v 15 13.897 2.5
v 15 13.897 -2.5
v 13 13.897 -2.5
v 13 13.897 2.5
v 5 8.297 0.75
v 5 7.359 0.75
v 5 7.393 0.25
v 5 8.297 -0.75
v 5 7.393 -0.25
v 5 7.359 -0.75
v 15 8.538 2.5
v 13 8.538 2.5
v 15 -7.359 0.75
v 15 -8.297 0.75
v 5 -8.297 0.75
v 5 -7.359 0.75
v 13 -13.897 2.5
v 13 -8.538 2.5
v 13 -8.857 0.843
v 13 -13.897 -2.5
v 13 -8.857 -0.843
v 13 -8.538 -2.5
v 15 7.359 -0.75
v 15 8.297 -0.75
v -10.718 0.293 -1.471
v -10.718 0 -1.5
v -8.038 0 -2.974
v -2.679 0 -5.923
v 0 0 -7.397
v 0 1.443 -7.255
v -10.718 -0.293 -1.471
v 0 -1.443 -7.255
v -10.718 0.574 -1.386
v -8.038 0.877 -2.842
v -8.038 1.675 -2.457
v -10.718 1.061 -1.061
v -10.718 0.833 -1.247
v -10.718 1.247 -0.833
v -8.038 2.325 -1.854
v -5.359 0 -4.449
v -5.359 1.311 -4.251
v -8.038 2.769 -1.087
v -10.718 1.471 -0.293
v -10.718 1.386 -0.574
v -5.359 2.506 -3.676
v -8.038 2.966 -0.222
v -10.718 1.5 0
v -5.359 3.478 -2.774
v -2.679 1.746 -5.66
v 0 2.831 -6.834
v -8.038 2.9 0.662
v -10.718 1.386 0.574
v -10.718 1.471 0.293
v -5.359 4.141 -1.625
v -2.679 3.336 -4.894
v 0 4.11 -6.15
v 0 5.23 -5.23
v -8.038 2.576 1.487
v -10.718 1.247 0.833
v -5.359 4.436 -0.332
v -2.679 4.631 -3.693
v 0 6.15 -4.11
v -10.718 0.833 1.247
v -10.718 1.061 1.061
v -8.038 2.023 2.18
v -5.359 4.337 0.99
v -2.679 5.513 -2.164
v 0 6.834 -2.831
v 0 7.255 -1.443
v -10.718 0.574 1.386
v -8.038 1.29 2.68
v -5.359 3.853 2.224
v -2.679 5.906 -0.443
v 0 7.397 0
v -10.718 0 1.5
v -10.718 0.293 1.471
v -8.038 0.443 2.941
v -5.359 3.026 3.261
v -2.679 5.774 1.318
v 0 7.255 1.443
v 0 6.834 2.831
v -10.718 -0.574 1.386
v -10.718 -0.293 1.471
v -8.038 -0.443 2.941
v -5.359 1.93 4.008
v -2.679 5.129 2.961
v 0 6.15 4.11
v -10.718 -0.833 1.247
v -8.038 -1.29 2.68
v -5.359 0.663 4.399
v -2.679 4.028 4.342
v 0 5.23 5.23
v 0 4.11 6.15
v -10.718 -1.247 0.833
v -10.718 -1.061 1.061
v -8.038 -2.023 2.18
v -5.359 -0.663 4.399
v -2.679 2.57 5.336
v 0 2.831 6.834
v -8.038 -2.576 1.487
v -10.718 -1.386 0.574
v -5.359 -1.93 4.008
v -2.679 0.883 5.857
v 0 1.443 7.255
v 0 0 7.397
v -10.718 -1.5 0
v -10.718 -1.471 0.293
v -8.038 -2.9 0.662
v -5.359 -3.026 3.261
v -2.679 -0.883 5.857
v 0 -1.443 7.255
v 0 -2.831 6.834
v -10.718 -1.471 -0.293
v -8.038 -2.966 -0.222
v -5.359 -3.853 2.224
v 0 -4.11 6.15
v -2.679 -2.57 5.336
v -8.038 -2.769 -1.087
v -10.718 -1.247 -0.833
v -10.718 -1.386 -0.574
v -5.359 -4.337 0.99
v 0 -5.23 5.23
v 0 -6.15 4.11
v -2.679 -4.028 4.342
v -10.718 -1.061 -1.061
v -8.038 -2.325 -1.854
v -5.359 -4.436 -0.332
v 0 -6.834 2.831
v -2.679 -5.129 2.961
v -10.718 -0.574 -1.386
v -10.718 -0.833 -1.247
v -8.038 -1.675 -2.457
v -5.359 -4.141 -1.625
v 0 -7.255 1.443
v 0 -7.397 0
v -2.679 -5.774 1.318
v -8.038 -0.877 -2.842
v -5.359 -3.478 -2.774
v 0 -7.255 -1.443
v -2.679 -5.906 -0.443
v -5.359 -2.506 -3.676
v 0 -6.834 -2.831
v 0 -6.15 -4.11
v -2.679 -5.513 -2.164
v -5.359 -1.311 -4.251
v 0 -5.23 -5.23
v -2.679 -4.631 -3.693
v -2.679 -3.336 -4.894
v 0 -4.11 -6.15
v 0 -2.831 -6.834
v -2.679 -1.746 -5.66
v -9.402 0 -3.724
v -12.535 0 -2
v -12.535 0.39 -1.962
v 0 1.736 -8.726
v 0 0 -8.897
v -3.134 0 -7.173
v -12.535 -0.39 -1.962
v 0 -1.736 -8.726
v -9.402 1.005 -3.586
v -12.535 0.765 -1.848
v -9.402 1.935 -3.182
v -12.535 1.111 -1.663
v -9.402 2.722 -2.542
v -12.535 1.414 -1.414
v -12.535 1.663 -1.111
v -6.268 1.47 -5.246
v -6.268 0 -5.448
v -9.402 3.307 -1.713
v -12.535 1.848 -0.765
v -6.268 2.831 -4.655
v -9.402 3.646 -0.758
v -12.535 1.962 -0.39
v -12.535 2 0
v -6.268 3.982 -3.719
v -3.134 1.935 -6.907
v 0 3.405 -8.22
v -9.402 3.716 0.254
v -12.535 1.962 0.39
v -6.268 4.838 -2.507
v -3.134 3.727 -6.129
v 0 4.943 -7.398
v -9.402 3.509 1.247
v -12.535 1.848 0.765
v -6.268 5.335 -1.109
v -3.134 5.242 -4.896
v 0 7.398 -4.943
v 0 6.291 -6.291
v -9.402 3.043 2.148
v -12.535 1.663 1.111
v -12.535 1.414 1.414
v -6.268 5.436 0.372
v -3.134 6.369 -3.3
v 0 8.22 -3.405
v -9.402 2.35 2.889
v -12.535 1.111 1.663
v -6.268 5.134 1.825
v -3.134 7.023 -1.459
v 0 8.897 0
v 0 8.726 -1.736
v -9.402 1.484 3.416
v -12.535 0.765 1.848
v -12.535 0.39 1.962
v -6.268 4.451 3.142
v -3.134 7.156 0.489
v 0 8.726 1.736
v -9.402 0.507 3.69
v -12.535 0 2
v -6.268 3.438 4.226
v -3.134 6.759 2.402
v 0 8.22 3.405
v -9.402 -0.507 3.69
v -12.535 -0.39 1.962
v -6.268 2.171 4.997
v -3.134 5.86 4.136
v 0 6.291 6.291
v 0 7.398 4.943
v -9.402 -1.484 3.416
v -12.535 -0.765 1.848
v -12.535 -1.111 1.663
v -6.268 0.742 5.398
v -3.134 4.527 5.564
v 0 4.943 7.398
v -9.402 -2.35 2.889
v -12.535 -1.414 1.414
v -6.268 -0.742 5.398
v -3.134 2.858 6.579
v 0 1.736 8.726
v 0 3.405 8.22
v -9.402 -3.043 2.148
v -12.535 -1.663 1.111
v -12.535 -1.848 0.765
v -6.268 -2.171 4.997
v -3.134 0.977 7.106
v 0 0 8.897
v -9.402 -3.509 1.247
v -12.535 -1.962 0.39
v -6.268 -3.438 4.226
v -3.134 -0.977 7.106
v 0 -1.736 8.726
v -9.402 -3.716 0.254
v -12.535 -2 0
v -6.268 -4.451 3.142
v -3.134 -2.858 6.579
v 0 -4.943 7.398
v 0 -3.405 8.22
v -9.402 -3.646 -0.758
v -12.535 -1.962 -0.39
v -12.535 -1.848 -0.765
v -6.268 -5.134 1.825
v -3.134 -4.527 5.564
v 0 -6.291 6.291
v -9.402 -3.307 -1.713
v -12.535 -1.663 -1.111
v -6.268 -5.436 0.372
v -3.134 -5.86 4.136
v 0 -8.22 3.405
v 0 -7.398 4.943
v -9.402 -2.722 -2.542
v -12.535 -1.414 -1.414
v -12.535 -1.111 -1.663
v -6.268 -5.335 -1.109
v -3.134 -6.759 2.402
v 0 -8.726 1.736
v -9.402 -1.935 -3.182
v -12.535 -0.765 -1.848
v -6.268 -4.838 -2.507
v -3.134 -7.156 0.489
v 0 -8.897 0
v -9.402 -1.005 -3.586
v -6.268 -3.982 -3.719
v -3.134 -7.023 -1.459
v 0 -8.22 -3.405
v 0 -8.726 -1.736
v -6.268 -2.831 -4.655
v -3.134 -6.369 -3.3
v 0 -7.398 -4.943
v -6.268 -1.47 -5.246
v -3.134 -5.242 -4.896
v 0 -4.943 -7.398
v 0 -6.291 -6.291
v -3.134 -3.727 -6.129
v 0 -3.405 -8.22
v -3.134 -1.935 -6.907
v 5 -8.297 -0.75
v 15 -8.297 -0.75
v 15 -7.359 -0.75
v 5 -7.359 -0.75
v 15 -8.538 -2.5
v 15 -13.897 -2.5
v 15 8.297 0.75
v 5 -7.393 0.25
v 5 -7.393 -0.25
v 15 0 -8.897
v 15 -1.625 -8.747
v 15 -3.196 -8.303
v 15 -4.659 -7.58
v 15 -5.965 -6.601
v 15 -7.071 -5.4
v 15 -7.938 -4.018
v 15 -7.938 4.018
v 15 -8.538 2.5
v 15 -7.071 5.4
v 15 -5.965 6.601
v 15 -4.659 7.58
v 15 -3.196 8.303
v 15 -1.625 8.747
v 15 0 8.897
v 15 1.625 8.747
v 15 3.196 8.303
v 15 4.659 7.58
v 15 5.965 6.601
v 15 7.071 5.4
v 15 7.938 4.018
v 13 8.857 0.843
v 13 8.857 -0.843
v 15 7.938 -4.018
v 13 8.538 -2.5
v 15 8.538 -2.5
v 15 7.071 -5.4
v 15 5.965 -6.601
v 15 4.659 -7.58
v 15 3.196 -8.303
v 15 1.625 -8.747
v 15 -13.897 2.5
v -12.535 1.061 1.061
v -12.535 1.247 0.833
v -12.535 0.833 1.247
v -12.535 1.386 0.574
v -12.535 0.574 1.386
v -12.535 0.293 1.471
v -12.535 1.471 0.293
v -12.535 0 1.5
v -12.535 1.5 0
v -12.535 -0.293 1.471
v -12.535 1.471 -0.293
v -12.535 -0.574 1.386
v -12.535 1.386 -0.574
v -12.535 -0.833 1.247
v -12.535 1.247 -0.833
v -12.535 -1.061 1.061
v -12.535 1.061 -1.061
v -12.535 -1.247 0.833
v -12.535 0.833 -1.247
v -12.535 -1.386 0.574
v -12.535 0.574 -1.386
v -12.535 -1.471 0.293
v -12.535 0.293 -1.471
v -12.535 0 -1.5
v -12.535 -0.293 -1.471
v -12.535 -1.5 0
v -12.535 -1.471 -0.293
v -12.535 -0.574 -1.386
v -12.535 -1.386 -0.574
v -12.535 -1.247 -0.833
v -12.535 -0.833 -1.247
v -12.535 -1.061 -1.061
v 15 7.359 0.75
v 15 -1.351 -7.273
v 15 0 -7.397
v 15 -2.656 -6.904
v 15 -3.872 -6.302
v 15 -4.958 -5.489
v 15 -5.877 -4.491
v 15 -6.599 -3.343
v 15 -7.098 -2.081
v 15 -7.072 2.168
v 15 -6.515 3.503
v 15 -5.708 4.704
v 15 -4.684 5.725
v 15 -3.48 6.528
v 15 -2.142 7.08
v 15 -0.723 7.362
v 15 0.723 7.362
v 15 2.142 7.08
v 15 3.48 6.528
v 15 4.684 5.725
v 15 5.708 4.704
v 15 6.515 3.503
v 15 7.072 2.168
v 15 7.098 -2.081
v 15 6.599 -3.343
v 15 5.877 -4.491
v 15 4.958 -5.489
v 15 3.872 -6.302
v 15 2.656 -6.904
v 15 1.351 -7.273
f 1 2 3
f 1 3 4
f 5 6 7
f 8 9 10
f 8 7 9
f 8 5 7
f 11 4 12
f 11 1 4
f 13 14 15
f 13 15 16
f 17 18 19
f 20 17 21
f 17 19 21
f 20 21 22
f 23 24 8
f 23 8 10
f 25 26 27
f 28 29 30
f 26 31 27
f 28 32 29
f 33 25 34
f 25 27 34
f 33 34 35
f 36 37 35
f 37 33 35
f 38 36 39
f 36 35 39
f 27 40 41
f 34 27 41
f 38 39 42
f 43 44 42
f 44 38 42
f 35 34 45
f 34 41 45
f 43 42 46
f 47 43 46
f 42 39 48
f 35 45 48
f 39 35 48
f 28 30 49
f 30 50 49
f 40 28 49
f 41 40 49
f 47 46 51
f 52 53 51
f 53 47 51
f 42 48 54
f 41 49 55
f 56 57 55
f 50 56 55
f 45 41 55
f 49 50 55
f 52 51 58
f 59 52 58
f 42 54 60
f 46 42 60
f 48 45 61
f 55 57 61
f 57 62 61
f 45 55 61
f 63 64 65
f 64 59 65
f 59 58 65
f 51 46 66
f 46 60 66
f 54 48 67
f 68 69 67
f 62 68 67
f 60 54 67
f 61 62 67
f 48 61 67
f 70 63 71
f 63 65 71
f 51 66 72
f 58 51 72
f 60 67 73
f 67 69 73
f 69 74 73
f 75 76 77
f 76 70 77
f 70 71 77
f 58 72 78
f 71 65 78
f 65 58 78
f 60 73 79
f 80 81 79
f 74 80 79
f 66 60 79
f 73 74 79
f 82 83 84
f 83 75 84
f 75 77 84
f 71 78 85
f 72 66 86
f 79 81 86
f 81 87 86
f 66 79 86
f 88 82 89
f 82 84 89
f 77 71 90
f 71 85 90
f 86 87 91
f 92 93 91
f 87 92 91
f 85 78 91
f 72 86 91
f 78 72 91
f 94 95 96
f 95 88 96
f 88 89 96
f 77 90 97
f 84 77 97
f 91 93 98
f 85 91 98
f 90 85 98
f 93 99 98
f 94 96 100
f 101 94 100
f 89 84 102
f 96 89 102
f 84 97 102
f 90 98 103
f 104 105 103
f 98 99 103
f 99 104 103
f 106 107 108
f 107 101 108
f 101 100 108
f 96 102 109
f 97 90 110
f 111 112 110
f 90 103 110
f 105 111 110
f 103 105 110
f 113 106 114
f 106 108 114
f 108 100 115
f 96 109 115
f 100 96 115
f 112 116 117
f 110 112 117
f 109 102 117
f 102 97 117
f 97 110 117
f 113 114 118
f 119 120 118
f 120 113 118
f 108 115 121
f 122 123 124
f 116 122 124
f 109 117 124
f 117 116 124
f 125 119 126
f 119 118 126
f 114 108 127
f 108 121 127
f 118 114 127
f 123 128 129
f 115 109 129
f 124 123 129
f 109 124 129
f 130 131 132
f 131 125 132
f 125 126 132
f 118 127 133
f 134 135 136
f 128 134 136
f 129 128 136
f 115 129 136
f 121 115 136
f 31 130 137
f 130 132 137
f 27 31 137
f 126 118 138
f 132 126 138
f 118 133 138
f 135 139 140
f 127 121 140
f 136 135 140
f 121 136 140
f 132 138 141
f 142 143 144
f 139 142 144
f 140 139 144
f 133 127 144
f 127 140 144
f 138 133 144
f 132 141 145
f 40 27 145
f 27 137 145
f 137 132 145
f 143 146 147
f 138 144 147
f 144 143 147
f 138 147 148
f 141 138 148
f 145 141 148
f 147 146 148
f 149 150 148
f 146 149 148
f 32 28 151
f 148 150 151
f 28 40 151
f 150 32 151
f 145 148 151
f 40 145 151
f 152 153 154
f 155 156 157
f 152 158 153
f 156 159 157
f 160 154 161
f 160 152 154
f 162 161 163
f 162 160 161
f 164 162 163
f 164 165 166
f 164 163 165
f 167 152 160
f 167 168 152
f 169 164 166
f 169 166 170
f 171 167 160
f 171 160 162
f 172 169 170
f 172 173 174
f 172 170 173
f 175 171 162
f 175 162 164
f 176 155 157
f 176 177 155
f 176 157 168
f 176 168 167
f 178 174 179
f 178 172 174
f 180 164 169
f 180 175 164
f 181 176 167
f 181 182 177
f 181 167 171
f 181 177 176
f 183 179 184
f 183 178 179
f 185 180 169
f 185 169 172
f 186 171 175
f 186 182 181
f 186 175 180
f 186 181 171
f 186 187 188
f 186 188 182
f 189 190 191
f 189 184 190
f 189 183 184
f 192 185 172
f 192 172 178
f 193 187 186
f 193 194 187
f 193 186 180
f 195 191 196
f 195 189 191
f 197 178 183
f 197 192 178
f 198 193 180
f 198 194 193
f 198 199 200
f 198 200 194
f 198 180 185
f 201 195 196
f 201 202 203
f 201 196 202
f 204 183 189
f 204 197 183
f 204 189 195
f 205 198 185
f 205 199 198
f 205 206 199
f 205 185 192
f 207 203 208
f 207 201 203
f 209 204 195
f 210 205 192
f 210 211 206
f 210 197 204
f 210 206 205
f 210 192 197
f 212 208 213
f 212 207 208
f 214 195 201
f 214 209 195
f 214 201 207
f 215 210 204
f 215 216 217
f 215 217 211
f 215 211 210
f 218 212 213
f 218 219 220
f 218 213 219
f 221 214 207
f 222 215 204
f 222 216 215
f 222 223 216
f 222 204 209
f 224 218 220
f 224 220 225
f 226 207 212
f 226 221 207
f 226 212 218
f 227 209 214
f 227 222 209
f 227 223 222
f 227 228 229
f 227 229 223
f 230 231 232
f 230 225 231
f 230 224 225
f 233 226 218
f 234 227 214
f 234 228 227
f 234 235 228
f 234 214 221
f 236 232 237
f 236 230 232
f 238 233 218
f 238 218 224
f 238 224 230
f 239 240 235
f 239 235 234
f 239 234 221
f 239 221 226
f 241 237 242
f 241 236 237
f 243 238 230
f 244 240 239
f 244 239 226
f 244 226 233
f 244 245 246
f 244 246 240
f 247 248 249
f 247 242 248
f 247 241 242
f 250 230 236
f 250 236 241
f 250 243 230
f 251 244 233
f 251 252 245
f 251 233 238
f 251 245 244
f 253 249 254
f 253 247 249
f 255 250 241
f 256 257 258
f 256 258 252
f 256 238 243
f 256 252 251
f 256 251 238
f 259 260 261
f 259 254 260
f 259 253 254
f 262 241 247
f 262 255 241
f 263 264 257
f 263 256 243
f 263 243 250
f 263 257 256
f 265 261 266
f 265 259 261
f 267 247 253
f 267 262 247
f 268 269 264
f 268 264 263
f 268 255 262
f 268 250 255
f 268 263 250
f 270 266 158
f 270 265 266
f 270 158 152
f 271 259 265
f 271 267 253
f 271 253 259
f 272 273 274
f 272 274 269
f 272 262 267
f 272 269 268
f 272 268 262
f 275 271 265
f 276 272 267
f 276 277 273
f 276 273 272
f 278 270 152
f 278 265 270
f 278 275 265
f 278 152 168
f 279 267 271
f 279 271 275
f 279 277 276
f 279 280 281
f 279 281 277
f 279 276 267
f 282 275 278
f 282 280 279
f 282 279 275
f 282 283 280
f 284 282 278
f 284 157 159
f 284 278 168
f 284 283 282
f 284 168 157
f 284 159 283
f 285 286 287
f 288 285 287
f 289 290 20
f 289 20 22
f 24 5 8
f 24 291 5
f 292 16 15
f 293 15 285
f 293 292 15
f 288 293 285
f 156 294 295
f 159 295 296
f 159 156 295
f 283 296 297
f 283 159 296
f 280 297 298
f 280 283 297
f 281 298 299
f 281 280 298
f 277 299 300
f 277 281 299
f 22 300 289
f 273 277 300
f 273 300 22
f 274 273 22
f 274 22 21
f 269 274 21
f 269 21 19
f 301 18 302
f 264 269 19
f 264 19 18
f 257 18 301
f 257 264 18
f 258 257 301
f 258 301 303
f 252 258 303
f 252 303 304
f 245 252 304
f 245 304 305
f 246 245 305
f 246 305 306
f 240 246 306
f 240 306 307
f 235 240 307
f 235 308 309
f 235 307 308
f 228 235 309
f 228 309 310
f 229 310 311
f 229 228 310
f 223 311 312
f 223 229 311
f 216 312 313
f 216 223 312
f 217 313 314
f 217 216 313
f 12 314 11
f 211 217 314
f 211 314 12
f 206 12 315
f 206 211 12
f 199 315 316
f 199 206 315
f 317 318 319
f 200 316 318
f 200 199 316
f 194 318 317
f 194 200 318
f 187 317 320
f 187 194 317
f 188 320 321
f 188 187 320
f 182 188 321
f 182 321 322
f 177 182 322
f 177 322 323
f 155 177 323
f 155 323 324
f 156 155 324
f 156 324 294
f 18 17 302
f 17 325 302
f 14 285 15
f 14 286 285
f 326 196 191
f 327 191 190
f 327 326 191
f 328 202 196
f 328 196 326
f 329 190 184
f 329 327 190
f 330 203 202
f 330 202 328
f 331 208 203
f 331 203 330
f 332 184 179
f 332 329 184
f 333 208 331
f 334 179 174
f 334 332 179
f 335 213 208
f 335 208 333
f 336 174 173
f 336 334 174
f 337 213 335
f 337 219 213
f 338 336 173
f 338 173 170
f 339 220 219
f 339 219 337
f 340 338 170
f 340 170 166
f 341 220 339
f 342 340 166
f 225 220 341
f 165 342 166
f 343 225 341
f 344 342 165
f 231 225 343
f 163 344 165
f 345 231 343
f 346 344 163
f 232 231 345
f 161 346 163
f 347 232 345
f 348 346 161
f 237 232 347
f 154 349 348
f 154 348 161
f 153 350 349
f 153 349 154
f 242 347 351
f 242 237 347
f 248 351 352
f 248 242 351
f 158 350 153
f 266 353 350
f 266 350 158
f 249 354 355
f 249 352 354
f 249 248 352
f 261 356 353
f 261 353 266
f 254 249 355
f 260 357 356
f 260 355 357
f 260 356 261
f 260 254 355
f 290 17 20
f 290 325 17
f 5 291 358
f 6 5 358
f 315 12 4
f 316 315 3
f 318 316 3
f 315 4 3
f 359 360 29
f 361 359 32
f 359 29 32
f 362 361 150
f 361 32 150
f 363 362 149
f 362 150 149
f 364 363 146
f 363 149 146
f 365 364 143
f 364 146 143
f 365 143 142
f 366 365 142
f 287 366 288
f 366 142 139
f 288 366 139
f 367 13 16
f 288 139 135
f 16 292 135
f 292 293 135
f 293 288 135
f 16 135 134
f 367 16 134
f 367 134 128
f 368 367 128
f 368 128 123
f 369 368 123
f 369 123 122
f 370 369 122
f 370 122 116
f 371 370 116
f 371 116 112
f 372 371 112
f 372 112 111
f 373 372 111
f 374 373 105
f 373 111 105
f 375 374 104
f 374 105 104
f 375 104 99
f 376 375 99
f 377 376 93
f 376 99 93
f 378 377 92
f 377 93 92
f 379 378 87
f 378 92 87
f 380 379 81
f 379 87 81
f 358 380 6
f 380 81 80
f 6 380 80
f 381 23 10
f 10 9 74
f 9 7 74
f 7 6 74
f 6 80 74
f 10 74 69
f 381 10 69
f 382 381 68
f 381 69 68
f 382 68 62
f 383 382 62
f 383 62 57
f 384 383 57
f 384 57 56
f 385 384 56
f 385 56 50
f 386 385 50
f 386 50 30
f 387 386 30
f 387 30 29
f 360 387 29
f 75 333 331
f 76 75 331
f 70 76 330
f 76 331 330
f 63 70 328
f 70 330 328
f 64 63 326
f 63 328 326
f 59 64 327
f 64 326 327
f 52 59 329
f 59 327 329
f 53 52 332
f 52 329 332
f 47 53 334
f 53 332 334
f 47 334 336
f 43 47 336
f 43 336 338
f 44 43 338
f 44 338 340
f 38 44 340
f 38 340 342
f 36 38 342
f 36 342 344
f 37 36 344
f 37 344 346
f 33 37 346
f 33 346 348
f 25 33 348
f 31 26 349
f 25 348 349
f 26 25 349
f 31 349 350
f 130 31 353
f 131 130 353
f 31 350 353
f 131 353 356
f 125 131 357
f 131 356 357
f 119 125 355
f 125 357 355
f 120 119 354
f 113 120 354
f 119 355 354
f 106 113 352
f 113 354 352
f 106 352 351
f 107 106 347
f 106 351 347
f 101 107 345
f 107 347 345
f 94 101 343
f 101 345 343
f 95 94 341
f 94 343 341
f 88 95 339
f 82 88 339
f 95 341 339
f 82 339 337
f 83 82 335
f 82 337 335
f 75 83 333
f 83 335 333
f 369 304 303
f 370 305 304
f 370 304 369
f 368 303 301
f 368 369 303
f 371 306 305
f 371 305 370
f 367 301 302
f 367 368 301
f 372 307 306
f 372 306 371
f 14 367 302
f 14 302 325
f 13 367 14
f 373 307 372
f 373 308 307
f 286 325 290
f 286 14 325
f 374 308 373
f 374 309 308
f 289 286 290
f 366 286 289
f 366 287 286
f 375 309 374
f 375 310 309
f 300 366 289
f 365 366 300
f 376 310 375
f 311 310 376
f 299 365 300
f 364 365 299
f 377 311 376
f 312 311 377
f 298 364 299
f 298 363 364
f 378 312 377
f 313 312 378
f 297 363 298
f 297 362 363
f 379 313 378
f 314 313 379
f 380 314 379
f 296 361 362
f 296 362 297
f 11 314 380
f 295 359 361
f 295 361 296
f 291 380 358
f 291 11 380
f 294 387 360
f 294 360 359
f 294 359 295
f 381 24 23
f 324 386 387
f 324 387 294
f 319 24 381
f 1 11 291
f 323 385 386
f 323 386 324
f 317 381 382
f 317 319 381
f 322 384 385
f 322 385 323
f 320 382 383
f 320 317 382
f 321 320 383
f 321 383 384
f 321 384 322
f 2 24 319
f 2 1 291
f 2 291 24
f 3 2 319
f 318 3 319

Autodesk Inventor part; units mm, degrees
ref_plane "YZ Plane" through (0, 0, 0) normal (1, 0, 0) x (0, 1, 0)
ref_plane "XZ Plane" through (0, 0, 0) normal (0, 1, 0) x (-1, 0, 0)
ref_plane "XY Plane" through (0, 0, 0) normal (0, 0, 1) x (1, 0, 0)
sketch "Sketch1" plane through (0, 0, 0) normal (0, 1, 0) x (-1, 0, 0)
  line L0 (0, 0) -> (12.5354, 0)
  line L1 (12.5354, 0) -> (12.5354, -2)
  line L2 (12.5354, -2) -> (0, -8.897)
  line L3 (0, -8.897) -> (0, -7.397)
  line L4 (10.9043, 0) -> (10.9043, -1.3974)
  line L5 (0, -7.397) -> (10.9043, -1.3974)
  dimension "d0" = 2
  dimension "d23" = 1.5
revolve "Revolution1" add sketch "Sketch1" angle 360 about axis through (0, 0, 0) along (-1, 0, 0)
sketch "Sketch2" plane through (0, 0, 0) normal (1, 0, 0) x (0, 0, -1)
  point P0 (0, 0)
sketch "Sketch3" plane through (-12.5354, 0, 0) normal (-1, 0, 0) x (0, 0, 1)
  point P0 (0, 0)
sketch "Sketch4" plane through (-12.5354, 0, 0) normal (-1, 0, 0) x (0, 0, 1)
  circle A0 centre (0, 0) radius 1.5
  dimension "d37" = 3
sketch "Sketch5" plane through (-12.5354, 0, 0) normal (-1, 0, 0) x (0, 0, 1)
  point P0 (0, 0)
extrude "Extrusion1" cut sketch "Sketch4" against normal blind 10
sketch "Sketch6" plane through (-2.3704, 0, 0) normal (-1, 0, 0) x (0, 0, 1)
  circle A0 centre (0, 0) radius 2
sketch "Sketch7" plane through (0, 0, 0) normal (1, 0, 0) x (0, 0, -1)
  circle A0 centre (0, 0) radius 8.897
extrude "Extrusion2" [suppressed]
sketch "Sketch8" plane through (15, 0, 0) normal (1, 0, 0) x (0, 0, -1)
  circle A0 centre (0, 0) radius 8.897 projected
  line L0 (-8.6693, -2) -> (-13.1693, -2)
  line L1 (-13.1693, -2) -> (-13.1693, 0)
  line L2 (-13.1693, 0) -> (-8.897, 0)
  line L3 (-8.6693, 2) -> (-13.1693, 2)
  line L4 (-13.1693, 2) -> (-13.1693, 0)
  line L5 (0, -8.897) -> (0, 8.897)
  line L6 (8.6693, -2) -> (13.1693, -2)
  line L7 (13.1693, -2) -> (13.1693, 0)
  line L8 (13.1693, 0) -> (8.897, 0)
  line L9 (8.6693, 2) -> (13.1693, 2)
  line L10 (13.1693, 2) -> (13.1693, 0)
  dimension "d8" = 4.5
  dimension "d9" = 2
extrude "Extrusion3" [suppressed]
sketch "Sketch9" plane through (15, 0, 0) normal (1, 0, 0) x (0, 0, -1)
  point P0 (0, 0)
sketch "Sketch10" plane through (15, 0, 0) normal (1, 0, 0) x (0, 0, -1)
  point P0 (0, 0)
sketch "Sketch11" plane through (15, 0, 0) normal (1, 0, 0) x (0, 0, -1)
  point P0 (0, 0)
sketch "Sketch12" plane through (15, 0, 0) normal (1, 0, 0) x (0, 0, -1)
  circle A0 centre (0, 0) radius 7.5
  dimension "d12" = 15
sketch "Sketch13" plane through (15, 0, 0) normal (1, 0, 0) x (0, 0, -1)
  line L0 (6.4465, 0.75) -> (8.4465, 0.75)
  line L1 (8.4465, 0.75) -> (8.4465, -0.75)
  line L2 (8.4465, -0.75) -> (6.4465, -0.75)
  line L3 (6.4465, -0.75) -> (6.4465, 0.75)
  line L4 (6.4465, 0.75) -> (8.4465, -0.75) construction
  line L5 (8.4465, 0.75) -> (6.4465, -0.75) construction
  line L6 (0, 7.445) -> (0, -3.9697)
  line L7 (-6.4465, 0.75) -> (-8.4465, 0.75)
  line L8 (-8.4465, 0.75) -> (-8.4465, -0.75)
  line L9 (-8.4465, -0.75) -> (-6.4465, -0.75)
  line L10 (-6.4465, -0.75) -> (-6.4465, 0.75)
  line L11 (-6.4465, 0.75) -> (-8.4465, -0.75) construction
  line L12 (-8.4465, 0.75) -> (-6.4465, -0.75) construction
  point P0 (0, 0)
  point P1 (7.4465, 0)
  point P2 (-7.4465, 0)
  dimension "d13" = 2
  dimension "d14" = 1.5
extrude "Extrusion4" [suppressed]
extrude "Extrusion5" [suppressed]
extrude "Extrusion6" [suppressed]
sketch "Sketch14" plane through (-2.3704, 0, 0) normal (-1, 0, 0) x (0, 0, 1)
  circle A0 centre (0, 0) radius 2
extrude "Extrusion7" [suppressed]
sketch "Sketch15" plane through (0, 0, 0) normal (1, 0, 0) x (0, 0, -1)
  circle A0 centre (0, 0) radius 8.897
  circle A1 centre (0, 0) radius 7.397
extrude "Extrusion8" add sketch "Sketch15" along normal blind 15
sketch "Sketch16" plane through (15, 0, 0) normal (1, 0, 0) x (0, 0, -1)
  point P0 (0, 0)
sketch "Sketch17" plane through (15, 0, 0) normal (1, 0, 0) x (0, 0, -1)
  circle A0 centre (0, 0) radius 8.897 projected
  line L0 (0, 8.897) -> (0, 13.897)
  line L1 (0, 13.897) -> (-2.5, 13.897)
  line L2 (-2.5, 13.897) -> (-2.5, 8.5385)
  line L3 (0, 13.897) -> (2.5, 13.897)
  line L4 (2.5, 13.897) -> (2.5, 8.5385)
  line L5 (-7.2862, 0) -> (2, 0)
  circle A1 centre (0, 0) radius 2 projected
  line L6 (0, -8.897) -> (0, -13.897)
  line L7 (0, -13.897) -> (-2.5, -13.897)
  line L8 (-2.5, -13.897) -> (-2.5, -8.5385)
  line L9 (0, -13.897) -> (2.5, -13.897)
  line L10 (2.5, -13.897) -> (2.5, -8.5385)
  dimension "d29" = 5
  dimension "d30" = 2.5
extrude "Extrusion9" add sketch "Sketch17" against normal blind 2 contours A0 L0 L3 L4 | L10 L9 L6 A0 | A0 L2 L1 L0 | L6 L7 L8 A0
sketch "Sketch18" plane through (15, 0, 0) normal (1, 0, 0) x (0, 0, -1)
  circle A0 centre (0, 0) radius 7.397 projected
  line L0 (0, -7.397) -> (0, -8.297)
  line L1 (0, -8.297) -> (-0.75, -8.297)
  line L2 (-0.75, -8.297) -> (-0.75, -7.3588)
  line L3 (0, -8.297) -> (0.75, -8.297)
  line L4 (0.75, -8.297) -> (0.75, -7.3588)
  line L5 (-4.4895, 0) -> (3.1188, 0)
  line L6 (0, 7.397) -> (0, 8.297)
  line L7 (0, 8.297) -> (-0.75, 8.297)
  line L8 (-0.75, 8.297) -> (-0.75, 7.3588)
  line L9 (0, 8.297) -> (0.75, 8.297)
  line L10 (0.75, 8.297) -> (0.75, 7.3588)
  dimension "d33" = 0.9
  dimension "d34" = 0.75
extrude "Extrusion10" cut sketch "Sketch18" against normal blind 10 contours A0 L6 L9 L10 | L4 L3 L0 A0 | A0 L8 L7 L6 | L0 L1 L2 A0
sketch "Sketch19" plane through (15, 0, 0) normal (1, 0, 0) x (0, 0, -1)
  point P0 (0, 0)
thread "Thread3" size "M3x0.5" class "6H" standard "ANSI Metric M Profile" length 10
properties part number "Joy stick part 2"
